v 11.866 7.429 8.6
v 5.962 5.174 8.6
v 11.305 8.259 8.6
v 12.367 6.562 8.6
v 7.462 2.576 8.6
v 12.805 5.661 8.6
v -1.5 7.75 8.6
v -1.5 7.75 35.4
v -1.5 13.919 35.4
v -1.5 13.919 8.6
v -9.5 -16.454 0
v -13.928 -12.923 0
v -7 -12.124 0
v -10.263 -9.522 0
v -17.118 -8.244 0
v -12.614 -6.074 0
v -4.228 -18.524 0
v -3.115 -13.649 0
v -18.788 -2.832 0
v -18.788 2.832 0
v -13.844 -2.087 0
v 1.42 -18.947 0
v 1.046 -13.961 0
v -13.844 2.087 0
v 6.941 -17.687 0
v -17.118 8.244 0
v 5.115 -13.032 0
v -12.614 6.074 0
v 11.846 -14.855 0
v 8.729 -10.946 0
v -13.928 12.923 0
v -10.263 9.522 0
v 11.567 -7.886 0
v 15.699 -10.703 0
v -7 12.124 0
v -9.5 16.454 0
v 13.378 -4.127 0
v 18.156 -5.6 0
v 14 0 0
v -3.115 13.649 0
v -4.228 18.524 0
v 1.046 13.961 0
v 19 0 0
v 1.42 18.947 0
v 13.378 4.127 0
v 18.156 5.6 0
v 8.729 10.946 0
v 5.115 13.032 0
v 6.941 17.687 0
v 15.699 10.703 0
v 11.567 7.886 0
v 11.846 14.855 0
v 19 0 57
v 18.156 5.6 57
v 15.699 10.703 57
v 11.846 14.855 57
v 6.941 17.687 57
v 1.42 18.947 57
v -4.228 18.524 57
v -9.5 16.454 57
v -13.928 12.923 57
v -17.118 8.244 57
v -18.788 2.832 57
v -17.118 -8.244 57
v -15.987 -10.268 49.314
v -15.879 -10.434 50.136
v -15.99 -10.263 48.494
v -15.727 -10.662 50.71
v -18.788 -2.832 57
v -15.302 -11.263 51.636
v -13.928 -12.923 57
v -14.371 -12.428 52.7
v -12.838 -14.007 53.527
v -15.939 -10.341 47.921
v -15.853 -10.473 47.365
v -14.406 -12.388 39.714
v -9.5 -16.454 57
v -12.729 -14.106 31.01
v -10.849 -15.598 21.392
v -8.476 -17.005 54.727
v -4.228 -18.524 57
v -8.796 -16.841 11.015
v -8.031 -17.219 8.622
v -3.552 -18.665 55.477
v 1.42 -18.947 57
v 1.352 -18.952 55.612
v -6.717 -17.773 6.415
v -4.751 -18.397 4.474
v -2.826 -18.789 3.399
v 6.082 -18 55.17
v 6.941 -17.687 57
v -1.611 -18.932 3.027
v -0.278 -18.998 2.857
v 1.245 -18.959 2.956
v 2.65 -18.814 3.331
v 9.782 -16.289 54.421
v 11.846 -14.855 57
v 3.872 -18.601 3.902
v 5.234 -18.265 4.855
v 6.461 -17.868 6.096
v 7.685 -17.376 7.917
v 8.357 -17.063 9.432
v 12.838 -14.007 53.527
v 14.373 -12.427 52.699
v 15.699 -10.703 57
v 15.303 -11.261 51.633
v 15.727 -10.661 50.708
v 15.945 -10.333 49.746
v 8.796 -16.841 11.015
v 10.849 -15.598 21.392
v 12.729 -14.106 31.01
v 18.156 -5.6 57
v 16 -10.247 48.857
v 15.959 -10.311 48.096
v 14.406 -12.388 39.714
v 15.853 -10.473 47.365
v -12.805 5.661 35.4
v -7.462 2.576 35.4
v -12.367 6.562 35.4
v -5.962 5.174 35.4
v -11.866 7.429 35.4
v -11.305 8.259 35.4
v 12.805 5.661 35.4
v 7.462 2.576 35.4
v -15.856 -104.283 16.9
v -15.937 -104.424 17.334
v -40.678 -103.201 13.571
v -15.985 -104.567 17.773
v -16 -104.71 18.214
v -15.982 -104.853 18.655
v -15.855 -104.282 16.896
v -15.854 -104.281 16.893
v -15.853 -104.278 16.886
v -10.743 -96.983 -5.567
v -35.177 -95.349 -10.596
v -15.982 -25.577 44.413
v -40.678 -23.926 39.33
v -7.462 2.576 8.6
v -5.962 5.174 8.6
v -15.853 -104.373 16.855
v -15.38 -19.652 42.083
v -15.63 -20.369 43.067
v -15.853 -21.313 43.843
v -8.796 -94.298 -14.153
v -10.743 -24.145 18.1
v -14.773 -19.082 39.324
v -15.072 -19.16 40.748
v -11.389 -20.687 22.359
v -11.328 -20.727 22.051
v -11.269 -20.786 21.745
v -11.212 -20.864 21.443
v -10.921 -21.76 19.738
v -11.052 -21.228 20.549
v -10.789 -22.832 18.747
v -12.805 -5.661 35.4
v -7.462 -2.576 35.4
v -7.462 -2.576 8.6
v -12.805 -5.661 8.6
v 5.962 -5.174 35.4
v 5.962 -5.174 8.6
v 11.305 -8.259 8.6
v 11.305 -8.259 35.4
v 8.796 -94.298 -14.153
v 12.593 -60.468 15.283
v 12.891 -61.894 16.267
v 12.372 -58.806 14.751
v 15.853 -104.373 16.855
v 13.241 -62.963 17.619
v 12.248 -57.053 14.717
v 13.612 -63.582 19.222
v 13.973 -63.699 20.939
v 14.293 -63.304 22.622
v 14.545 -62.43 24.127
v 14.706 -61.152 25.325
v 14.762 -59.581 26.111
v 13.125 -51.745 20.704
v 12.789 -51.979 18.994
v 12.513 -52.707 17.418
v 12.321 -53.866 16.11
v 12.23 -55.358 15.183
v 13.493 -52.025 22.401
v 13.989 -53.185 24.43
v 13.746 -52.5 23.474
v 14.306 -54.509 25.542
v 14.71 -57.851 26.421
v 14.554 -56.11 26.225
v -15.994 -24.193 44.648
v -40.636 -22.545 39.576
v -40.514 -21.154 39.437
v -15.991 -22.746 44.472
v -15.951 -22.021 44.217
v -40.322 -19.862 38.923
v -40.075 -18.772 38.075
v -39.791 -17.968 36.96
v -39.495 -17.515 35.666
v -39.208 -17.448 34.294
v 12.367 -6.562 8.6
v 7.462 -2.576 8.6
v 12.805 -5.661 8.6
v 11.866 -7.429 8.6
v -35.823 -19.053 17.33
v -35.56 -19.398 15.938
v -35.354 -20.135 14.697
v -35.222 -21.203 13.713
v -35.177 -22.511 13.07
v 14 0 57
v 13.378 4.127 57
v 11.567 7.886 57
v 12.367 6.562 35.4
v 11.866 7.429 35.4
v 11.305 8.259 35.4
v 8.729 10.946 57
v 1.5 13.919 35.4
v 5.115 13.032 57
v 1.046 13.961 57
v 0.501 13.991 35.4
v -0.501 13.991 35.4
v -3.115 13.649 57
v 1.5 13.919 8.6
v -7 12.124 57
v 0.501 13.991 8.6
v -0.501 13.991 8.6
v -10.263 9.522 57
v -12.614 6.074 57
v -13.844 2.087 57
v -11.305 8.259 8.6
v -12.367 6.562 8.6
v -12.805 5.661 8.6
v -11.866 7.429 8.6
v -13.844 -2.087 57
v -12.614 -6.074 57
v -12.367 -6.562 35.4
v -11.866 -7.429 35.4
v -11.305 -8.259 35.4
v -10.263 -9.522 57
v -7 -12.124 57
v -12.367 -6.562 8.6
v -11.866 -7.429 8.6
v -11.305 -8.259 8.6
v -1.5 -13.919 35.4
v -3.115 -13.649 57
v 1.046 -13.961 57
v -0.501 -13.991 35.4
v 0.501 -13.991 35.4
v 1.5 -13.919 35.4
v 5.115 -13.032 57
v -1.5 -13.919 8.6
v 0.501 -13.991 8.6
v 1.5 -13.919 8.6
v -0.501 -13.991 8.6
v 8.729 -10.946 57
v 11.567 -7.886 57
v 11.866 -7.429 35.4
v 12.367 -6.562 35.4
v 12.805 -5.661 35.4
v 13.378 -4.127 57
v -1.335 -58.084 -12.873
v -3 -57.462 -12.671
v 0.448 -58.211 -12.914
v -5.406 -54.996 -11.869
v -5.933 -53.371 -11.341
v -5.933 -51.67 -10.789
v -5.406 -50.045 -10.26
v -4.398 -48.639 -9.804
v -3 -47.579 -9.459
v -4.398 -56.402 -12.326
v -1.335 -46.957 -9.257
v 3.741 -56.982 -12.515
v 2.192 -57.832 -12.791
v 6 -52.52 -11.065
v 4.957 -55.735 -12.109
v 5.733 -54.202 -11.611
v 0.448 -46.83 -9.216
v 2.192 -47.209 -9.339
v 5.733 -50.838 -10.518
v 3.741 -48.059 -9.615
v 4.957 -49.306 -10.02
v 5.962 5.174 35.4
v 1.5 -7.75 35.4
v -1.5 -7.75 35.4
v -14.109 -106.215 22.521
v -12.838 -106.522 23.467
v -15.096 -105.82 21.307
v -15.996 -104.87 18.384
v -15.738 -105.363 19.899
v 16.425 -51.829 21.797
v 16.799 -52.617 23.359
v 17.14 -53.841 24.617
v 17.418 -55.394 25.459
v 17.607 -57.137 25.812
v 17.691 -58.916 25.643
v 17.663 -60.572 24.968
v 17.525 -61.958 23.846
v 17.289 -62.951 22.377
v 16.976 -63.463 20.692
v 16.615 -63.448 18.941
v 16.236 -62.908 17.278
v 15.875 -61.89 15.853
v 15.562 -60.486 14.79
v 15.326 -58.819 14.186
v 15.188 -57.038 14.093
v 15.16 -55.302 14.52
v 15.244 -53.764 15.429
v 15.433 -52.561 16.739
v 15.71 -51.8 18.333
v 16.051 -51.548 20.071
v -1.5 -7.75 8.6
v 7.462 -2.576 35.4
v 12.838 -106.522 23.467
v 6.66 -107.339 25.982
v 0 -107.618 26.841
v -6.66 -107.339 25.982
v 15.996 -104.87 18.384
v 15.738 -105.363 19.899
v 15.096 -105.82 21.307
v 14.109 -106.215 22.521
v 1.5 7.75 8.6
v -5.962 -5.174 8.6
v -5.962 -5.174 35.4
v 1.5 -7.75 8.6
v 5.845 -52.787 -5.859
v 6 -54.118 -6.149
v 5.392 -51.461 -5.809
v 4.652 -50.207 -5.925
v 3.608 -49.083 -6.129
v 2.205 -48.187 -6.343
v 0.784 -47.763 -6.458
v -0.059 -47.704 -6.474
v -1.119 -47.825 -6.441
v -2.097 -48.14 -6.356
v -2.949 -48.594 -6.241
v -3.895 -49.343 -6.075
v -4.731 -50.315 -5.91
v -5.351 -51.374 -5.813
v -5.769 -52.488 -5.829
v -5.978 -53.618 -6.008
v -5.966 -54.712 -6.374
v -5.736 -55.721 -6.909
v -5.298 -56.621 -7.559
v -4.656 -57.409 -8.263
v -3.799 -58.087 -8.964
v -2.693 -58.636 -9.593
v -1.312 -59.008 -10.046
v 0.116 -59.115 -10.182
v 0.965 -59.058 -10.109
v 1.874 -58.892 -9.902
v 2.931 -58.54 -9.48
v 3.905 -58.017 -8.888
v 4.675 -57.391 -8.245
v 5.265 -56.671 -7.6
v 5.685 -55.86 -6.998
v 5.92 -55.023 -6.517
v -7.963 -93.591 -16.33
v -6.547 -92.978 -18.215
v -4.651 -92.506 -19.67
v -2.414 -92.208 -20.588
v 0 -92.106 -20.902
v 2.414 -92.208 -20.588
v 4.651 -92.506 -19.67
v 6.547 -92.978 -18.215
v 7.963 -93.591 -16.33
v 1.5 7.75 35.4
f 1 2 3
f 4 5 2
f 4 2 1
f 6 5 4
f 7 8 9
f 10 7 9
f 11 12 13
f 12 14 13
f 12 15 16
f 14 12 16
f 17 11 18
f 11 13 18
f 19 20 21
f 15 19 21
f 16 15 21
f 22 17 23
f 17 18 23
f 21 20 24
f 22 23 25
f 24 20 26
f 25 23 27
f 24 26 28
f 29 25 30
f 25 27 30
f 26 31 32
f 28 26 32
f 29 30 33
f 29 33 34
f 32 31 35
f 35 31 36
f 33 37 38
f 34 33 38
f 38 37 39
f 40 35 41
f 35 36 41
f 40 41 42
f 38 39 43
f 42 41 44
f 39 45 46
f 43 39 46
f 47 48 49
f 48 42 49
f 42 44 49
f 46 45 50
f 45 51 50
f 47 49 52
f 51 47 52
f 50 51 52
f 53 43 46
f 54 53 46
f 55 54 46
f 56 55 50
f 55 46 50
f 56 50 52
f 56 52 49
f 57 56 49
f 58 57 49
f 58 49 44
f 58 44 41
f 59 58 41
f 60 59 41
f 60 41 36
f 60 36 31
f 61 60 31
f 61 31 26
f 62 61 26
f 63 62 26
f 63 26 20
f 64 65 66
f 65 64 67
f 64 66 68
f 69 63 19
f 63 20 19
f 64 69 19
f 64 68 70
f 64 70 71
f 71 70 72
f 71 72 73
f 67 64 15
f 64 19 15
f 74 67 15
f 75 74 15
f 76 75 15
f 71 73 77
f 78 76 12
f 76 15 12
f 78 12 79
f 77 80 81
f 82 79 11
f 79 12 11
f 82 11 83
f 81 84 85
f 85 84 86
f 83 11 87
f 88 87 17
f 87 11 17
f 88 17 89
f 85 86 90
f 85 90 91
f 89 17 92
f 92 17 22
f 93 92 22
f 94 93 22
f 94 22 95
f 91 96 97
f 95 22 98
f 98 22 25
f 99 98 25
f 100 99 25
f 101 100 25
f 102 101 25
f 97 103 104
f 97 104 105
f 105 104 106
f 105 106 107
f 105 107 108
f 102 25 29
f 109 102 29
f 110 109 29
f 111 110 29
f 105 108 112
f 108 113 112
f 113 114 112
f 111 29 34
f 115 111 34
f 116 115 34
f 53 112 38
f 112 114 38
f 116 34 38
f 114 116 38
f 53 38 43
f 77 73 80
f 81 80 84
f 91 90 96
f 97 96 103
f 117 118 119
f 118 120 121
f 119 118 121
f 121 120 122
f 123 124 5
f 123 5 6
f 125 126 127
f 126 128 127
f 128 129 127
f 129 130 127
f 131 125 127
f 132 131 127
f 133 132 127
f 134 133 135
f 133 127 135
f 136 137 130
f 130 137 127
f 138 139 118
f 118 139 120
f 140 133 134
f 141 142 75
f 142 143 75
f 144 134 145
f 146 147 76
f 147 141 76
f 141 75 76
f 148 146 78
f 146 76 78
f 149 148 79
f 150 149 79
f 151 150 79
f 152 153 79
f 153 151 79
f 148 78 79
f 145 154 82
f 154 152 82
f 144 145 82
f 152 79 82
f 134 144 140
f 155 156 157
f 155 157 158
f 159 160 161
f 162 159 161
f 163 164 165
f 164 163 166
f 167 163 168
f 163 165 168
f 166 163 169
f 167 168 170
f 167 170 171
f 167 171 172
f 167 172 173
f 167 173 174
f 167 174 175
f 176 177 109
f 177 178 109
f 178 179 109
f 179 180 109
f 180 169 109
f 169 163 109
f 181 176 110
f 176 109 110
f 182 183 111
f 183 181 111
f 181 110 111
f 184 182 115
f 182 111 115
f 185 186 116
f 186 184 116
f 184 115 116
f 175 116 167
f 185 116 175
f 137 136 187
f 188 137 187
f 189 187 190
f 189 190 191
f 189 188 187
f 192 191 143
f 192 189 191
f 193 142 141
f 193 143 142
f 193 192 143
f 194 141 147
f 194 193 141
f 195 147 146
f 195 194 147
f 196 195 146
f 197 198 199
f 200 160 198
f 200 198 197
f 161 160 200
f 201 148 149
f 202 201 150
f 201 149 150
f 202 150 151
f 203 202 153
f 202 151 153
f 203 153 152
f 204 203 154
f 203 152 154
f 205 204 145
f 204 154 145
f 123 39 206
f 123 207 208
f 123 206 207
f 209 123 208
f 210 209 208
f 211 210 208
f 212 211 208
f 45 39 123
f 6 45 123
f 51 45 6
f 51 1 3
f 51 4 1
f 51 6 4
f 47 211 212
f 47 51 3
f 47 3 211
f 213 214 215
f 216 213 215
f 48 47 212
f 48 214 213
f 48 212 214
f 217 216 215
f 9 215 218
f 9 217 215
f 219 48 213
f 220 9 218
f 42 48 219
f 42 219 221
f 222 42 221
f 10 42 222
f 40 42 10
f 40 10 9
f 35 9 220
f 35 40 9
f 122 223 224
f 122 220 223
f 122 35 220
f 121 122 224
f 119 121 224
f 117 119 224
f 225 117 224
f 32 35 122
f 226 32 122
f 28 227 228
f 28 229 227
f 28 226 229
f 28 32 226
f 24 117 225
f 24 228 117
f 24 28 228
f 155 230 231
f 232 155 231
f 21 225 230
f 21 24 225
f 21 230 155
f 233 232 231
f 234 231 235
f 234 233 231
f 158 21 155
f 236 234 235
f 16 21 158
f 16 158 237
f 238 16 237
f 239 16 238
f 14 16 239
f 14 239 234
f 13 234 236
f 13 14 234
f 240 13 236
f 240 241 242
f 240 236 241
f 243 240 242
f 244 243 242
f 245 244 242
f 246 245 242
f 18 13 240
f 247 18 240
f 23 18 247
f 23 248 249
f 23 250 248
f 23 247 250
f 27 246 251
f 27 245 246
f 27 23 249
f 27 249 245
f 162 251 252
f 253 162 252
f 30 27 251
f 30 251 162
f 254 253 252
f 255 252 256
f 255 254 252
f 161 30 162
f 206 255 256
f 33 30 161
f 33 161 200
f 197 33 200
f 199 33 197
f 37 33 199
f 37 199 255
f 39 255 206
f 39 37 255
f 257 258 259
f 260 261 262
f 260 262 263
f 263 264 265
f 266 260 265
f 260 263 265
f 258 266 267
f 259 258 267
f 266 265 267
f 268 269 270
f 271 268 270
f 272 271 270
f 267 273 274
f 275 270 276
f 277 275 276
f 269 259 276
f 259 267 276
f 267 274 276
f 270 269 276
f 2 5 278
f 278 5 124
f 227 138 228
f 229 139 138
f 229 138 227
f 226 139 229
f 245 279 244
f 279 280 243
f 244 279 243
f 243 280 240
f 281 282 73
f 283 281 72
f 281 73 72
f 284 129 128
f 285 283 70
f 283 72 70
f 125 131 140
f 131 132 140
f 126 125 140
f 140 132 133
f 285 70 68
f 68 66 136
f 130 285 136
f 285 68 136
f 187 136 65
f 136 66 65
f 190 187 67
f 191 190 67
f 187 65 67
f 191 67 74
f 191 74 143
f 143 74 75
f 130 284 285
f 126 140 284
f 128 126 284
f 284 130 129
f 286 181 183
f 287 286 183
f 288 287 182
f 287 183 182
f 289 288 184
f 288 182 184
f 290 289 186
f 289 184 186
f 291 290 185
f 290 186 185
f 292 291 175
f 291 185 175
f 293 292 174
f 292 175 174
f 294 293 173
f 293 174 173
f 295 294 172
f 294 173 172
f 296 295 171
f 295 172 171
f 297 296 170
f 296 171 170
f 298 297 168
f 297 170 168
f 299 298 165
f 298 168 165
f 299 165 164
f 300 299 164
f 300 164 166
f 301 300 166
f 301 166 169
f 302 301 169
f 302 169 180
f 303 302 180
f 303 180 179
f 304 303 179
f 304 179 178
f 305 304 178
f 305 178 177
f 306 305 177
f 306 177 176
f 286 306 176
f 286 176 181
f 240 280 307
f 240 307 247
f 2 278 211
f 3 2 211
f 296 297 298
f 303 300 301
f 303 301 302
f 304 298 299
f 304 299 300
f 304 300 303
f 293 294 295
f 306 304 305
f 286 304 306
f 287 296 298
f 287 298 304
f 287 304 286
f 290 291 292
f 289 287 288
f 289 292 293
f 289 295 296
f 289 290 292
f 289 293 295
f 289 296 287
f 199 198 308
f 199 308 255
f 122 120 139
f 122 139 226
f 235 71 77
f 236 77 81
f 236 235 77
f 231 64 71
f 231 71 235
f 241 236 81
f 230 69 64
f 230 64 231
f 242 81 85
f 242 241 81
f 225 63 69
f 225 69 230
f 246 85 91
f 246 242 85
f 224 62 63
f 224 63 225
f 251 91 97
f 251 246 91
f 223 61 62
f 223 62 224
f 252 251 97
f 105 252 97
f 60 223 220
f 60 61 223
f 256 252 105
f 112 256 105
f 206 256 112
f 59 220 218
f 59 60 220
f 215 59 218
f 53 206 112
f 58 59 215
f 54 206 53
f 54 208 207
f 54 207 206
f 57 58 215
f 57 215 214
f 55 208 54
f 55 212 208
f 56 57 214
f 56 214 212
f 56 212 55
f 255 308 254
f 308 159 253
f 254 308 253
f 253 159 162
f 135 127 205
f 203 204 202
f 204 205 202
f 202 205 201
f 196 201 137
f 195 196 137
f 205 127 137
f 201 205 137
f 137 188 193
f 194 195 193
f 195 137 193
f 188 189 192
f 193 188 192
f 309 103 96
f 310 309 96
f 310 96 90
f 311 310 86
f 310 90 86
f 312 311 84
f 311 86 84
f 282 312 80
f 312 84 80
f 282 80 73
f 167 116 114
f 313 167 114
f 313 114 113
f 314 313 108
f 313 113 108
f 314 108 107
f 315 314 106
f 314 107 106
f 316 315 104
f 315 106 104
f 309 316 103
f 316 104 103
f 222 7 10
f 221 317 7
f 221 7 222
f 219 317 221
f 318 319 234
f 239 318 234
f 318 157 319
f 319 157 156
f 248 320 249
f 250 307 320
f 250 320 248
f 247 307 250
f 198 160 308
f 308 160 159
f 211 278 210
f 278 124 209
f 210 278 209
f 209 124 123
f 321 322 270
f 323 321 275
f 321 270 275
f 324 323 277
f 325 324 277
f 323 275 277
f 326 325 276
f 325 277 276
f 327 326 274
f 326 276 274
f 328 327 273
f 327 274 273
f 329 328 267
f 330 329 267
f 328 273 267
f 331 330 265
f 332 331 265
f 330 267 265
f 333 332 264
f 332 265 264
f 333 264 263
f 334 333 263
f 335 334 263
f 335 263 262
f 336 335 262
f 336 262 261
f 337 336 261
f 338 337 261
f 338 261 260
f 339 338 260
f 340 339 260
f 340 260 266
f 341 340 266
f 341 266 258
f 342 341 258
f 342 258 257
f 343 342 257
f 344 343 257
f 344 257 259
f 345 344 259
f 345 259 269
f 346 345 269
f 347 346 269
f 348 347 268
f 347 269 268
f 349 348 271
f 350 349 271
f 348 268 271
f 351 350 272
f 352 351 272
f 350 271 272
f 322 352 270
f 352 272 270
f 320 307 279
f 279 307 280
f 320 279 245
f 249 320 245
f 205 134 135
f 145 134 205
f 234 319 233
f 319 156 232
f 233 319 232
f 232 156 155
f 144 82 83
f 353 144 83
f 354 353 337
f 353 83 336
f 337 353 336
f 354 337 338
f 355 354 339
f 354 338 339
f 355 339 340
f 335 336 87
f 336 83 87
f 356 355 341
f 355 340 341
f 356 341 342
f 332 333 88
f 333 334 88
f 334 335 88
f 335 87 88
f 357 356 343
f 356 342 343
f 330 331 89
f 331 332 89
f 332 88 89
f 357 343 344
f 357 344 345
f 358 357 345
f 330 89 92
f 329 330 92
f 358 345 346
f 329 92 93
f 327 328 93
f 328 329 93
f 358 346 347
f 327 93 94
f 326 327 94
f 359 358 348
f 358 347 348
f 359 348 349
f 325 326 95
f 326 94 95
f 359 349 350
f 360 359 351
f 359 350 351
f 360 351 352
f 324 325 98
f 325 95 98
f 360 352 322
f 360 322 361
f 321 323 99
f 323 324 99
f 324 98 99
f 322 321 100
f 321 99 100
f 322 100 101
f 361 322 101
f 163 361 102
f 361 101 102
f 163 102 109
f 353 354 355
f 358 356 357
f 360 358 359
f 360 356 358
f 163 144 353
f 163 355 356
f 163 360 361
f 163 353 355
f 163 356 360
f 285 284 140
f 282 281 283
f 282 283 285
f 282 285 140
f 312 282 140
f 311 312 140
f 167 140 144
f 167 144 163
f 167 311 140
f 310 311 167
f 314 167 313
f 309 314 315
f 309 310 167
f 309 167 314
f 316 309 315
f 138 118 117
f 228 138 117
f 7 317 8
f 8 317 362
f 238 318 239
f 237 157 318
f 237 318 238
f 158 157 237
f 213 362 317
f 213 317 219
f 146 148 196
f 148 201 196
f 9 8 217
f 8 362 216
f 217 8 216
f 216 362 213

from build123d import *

# Parameters (mm, degrees)
CYLINDER002_R         = 20
CYLINDER002_DEPTH     = 10
PAD_DEPTH             = 100
CLONE_PLACEMENT_ANGLE = 18
SKETCH010_R           = 6
PAD008_DEPTH          = 3
SKETCH011_R           = 6
PAD009_DEPTH          = 10
PAD010_DEPTH          = 25
PAD010_DEPTH_BACK     = 1
CYLINDER_R            = 19
CYLINDER_DEPTH        = 57
SKETCH006_R           = 14
POCKET001_DEPTH       = 20.9027
POCKET001_DEPTH_BACK  = 57.001
SKETCH001_W           = 7.25
SKETCH001_H           = 26.8
PAD001_DEPTH          = 1.5
POLARPATTERN_COUNT    = 6


with BuildPart() as cylinder002:
    # Cylinder002 → Cylinder002 (new body)
    with BuildSketch(Plane.XY.offset(56)):
        Circle(CYLINDER002_R)
    extrude(amount=CYLINDER002_DEPTH)


with BuildPart() as cut:
    # Sketch → Pad (new body)
    with BuildSketch(Plane.XZ):
        with BuildLine():
            Line((-15.852902, 39.699504), (-8.796326, 7.096149))
            ThreePointArc((-8.796326, 7.096149), (0, 0), (8.796326, 7.096149))
            Line((8.796326, 7.096149), (15.852902, 39.699504))
            ThreePointArc((15.852902, 39.699504), (15.463392, 43.660617), (12.837838, 46.652038))
            ThreePointArc((12.837838, 46.652038), (0, 50.2), (-12.837838, 46.652038))
            ThreePointArc((-12.837838, 46.652038), (-15.463392, 43.660617), (-15.852902, 39.699504))
        make_face()
    extrude(amount=PAD_DEPTH)


with BuildPart() as cut_1:
    # Body placement: moved
    add(cut.part.moved(Location((100, 0, 0))))


with BuildPart() as cut_2:
    # Clone placement: moved
    add(cut_1.part.moved(Location((-100, 3, 10))).rotate(Axis((-100, 3, 10), (1, 0, 0)), CLONE_PLACEMENT_ANGLE))

    # Sketch010 (on Face3 of Clone) → Pad008 (new body)
    with BuildSketch(Plane(origin=(6.93556, 3.463869, 8.572357), x_dir=(0, 0.951057, 0.309017), z_dir=(0.97737, 0.065369, -0.201186))):
        with Locations((-54.5, 31)):
            Circle(SKETCH010_R)
    extrude(amount=PAD008_DEPTH)

    # Sketch011 → Pad009 (join)
    with BuildSketch(Plane(origin=(0, 0, 6), x_dir=(1, 0, 0), z_dir=(0, -0.309017, 0.951057))):
        with Locations((0, -55.223284)):
            Circle(SKETCH011_R)
    extrude(amount=PAD009_DEPTH)

    # Sketch012 (on Face1 of Pad009) → Pad010 (join, two sides)
    with BuildSketch(Plane(origin=(-6.93556, 3.463869, 8.572357), x_dir=(0, -0.951057, -0.309017), z_dir=(-0.97737, 0.065369, -0.201186))) as pad010_sk:
        with BuildLine():
            Line((16.544459, 44), (99.9, 44))
            Line((99.9, 44), (99.9, 18))
            Line((99.9, 18), (23.31369, 18))
            ThreePointArc((18.708854, 21.0518), (20.551535, 18.832207), (23.31369, 18))
            Line((18.708854, 21.0518), (11.939623, 37.0518))
            ThreePointArc((16.544459, 44), (12.376666, 41.762155), (11.939623, 37.0518))
        make_face()
    extrude(amount=PAD010_DEPTH)
    extrude(pad010_sk.sketch, amount=-PAD010_DEPTH_BACK)

    # Cut: cut Cylinder002
    add(cylinder002.part, mode=Mode.SUBTRACT)


with BuildPart() as ello_beam_head:
    # Cylinder → Cylinder (new body)
    with BuildSketch(Plane.XY):
        Circle(CYLINDER_R)
    extrude(amount=CYLINDER_DEPTH)

    # Fusion: union Cut
    add(cut_2.part)

    # Sketch006 → Pocket001 (cut, two sides)
    with BuildSketch(Plane.XY) as pocket001_sk:
        Circle(SKETCH006_R)
    extrude(amount=-POCKET001_DEPTH, mode=Mode.SUBTRACT)
    extrude(pocket001_sk.sketch, amount=POCKET001_DEPTH_BACK, mode=Mode.SUBTRACT)

    # Sketch001 → Pad001 (join, symmetric)
    with BuildSketch(Plane.YZ):
        with Locations((11.375, 22)):
            Rectangle(SKETCH001_W, SKETCH001_H)
    pad001 = extrude(amount=PAD001_DEPTH, both=True)

    # PolarPattern: Pad001 ×6 about axis
    polarpattern_axis = Axis((0, 0, 0), (0, 0, 1))
    for i in range(1, POLARPATTERN_COUNT):
        add(pad001.rotate(polarpattern_axis, i * 360 / POLARPATTERN_COUNT))


solid = ello_beam_head.part
